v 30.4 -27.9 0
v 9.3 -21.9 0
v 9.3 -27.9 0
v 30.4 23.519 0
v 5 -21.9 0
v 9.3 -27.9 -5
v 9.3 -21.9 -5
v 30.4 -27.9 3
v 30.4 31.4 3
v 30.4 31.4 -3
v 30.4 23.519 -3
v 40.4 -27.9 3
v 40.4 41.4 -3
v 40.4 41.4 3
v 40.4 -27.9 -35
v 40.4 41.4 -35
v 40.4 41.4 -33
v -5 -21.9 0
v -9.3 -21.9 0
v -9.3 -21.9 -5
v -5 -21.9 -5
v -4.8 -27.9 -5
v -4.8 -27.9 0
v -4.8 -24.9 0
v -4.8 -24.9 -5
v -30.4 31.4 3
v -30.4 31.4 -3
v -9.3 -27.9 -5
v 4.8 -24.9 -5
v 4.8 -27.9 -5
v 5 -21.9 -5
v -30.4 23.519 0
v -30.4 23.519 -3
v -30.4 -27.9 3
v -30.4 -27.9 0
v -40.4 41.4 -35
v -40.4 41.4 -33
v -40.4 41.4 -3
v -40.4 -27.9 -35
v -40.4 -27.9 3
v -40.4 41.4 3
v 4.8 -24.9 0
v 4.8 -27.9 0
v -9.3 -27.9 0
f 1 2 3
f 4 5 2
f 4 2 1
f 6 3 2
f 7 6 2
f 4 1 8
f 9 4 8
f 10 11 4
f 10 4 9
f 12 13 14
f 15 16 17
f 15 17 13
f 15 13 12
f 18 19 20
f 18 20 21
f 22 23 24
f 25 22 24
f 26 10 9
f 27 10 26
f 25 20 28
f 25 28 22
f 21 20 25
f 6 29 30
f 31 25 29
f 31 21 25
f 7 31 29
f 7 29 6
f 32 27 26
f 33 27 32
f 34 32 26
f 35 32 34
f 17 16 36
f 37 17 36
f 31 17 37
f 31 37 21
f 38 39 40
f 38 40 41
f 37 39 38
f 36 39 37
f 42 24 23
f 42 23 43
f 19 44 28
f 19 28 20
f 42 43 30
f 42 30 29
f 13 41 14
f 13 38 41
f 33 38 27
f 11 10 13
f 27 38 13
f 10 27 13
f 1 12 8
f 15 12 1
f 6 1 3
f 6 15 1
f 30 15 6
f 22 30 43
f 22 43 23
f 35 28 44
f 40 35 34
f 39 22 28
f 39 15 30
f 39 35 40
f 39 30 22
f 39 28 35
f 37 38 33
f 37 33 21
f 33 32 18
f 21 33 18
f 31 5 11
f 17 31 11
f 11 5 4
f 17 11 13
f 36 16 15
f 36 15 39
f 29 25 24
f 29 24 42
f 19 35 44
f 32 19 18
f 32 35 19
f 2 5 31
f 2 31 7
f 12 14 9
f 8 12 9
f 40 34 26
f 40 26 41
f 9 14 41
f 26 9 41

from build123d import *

# Parameters (mm, degrees)
BOSS_EXTRUDE1_DEPTH = 3
BOSS_EXTRUDE5_DEPTH = 35
BOSS_EXTRUDE6_DEPTH = 3
SKETCH8_W           = 80.8
SKETCH8_H           = 69.3
BOSS_EXTRUDE8_DEPTH = 2
BOSS_EXTRUDE9_DEPTH = 80.8
SKETCH10_W          = 4.5
SKETCH10_H          = 6
CUT_EXTRUDE1_DEPTH  = 5
SKETCH13_W          = 9.8
SKETCH13_H          = 3
CUT_EXTRUDE2_DEPTH  = 5


with BuildPart() as part:
    # Sketch1 → Boss-Extrude1 (new body)
    with BuildSketch(Plane.XY):
        Polygon((30.4, -26.4), (40.4, -26.4), (40.4, 41.4), (-40.4, 41.4), (-40.4, -26.4), (-30.4, -26.4), (-30.4, 31.4), (30.4, 31.4), align=None)
    extrude(amount=-BOSS_EXTRUDE1_DEPTH)

    # Sketch5 → Boss-Extrude5 (add)
    with BuildSketch(Plane.XY):
        Polygon((-40.4, 41.4), (-5, -21.9), (0, -21.9), (5, -21.9), (40.4, 41.4), (40.4, -27.9), (-40.4, -27.9), align=None)
    extrude(amount=-BOSS_EXTRUDE5_DEPTH)

    # Sketch6 → Boss-Extrude6 (add)
    with BuildSketch(Plane.XY):
        Polygon((-40.4, 41.4), (40.4, 41.4), (40.4, -27.9), (30.4, -27.9), (30.4, 31.4), (-30.4, 31.4), (-30.4, -27.9), (-40.4, -27.9), align=None)
    extrude(amount=BOSS_EXTRUDE6_DEPTH)

    # Sketch8 → Boss-Extrude8 (add)
    with BuildSketch(Plane(origin=(0, 0, -35), x_dir=(-1, 0, 0), z_dir=(0, 0, -1))):
        with Locations((0, 6.75)):
            Rectangle(SKETCH8_W, SKETCH8_H)
    extrude(amount=-BOSS_EXTRUDE8_DEPTH)

    # Sketch9 → Boss-Extrude9 (add)
    with BuildSketch(Plane(origin=(40.4, 0, 0), x_dir=(0, 0, -1), z_dir=(1, 0, 0))):
        Polygon((33, -21.9), (33, 41.4), (5, -21.9), align=None)
    extrude(amount=-BOSS_EXTRUDE9_DEPTH)

    # Sketch10 → Cut-Extrude1 (cut)
    with BuildSketch(Plane.XY):
        with Locations((7.05, -24.9)):
            Rectangle(SKETCH10_W, SKETCH10_H)
        with Locations((-7.05, -24.9)):
            Rectangle(SKETCH10_W, SKETCH10_H)
    extrude(amount=-CUT_EXTRUDE1_DEPTH, mode=Mode.SUBTRACT)

    # Sketch13 → Cut-Extrude2 (cut)
    with BuildSketch(Plane.XY.offset(-5)):
        with Locations((-0.1, -23.4)):
            Rectangle(SKETCH13_W, SKETCH13_H)
    extrude(amount=CUT_EXTRUDE2_DEPTH, mode=Mode.SUBTRACT)


solid = part.part
